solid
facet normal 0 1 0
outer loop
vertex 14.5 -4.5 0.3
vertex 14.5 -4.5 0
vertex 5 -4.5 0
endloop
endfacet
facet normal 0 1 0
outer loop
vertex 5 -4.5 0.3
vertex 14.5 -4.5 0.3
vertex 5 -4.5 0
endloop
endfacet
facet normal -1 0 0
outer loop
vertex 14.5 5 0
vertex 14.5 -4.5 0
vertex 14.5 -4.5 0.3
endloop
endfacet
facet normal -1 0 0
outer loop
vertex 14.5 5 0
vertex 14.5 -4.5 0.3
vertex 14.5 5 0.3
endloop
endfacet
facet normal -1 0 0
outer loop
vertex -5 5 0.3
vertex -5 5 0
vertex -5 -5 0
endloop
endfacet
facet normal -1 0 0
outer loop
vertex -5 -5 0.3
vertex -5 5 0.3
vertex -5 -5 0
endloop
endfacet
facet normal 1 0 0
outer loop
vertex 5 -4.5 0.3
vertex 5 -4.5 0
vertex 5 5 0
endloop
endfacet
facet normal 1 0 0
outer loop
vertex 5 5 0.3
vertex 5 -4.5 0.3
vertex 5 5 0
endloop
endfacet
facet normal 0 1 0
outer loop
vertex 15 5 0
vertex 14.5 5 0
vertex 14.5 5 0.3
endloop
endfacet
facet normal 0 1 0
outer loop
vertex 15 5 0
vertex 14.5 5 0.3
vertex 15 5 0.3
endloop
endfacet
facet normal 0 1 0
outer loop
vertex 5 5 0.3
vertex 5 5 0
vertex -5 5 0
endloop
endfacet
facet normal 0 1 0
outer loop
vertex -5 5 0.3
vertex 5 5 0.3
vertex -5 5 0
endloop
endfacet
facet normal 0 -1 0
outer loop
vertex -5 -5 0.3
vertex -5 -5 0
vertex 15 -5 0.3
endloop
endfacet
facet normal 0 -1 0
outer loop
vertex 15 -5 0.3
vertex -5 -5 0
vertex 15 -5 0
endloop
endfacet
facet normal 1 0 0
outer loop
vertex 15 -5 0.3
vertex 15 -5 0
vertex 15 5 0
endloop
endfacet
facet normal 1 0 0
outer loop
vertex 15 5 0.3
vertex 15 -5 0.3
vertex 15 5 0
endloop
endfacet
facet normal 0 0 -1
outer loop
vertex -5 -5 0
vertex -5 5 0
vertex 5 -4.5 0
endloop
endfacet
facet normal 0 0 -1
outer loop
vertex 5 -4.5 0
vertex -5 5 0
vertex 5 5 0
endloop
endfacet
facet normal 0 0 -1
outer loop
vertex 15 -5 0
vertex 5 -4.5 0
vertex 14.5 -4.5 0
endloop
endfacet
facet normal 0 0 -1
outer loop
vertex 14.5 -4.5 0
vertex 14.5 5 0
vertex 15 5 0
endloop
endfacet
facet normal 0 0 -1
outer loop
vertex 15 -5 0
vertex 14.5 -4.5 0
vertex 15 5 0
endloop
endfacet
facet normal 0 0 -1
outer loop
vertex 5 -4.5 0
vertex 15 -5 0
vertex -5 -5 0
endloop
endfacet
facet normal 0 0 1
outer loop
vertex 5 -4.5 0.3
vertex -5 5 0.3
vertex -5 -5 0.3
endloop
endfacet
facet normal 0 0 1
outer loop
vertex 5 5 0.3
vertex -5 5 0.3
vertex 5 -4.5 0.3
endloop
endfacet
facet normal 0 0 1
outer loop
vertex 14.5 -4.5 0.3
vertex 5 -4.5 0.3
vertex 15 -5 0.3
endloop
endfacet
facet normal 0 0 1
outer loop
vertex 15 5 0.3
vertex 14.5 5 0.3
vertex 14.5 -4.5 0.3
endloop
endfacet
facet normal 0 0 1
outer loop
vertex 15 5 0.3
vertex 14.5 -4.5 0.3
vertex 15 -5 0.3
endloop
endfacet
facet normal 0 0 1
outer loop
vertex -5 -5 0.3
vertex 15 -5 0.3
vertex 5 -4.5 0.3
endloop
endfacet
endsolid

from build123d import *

# Parameters (mm, degrees)
F0_W     = 0.5
F0_H     = 9.5
F1_DEPTH = 0.3


with BuildPart() as f1:
    # F0 (on Top) → F1 (new body)
    with BuildSketch(Plane.XY):
        Polygon((5, 5), (-5, 5), (-5, -5), (5, -5), (5, -4.5), align=None)
        Polygon((14.5, -4.5), (5, -4.5), (5, -5), (15, -5), (15, -4.5), align=None)
        with Locations((14.75, 0.25)):
            Rectangle(F0_W, F0_H)
    extrude(amount=F1_DEPTH)


solid = f1.part
